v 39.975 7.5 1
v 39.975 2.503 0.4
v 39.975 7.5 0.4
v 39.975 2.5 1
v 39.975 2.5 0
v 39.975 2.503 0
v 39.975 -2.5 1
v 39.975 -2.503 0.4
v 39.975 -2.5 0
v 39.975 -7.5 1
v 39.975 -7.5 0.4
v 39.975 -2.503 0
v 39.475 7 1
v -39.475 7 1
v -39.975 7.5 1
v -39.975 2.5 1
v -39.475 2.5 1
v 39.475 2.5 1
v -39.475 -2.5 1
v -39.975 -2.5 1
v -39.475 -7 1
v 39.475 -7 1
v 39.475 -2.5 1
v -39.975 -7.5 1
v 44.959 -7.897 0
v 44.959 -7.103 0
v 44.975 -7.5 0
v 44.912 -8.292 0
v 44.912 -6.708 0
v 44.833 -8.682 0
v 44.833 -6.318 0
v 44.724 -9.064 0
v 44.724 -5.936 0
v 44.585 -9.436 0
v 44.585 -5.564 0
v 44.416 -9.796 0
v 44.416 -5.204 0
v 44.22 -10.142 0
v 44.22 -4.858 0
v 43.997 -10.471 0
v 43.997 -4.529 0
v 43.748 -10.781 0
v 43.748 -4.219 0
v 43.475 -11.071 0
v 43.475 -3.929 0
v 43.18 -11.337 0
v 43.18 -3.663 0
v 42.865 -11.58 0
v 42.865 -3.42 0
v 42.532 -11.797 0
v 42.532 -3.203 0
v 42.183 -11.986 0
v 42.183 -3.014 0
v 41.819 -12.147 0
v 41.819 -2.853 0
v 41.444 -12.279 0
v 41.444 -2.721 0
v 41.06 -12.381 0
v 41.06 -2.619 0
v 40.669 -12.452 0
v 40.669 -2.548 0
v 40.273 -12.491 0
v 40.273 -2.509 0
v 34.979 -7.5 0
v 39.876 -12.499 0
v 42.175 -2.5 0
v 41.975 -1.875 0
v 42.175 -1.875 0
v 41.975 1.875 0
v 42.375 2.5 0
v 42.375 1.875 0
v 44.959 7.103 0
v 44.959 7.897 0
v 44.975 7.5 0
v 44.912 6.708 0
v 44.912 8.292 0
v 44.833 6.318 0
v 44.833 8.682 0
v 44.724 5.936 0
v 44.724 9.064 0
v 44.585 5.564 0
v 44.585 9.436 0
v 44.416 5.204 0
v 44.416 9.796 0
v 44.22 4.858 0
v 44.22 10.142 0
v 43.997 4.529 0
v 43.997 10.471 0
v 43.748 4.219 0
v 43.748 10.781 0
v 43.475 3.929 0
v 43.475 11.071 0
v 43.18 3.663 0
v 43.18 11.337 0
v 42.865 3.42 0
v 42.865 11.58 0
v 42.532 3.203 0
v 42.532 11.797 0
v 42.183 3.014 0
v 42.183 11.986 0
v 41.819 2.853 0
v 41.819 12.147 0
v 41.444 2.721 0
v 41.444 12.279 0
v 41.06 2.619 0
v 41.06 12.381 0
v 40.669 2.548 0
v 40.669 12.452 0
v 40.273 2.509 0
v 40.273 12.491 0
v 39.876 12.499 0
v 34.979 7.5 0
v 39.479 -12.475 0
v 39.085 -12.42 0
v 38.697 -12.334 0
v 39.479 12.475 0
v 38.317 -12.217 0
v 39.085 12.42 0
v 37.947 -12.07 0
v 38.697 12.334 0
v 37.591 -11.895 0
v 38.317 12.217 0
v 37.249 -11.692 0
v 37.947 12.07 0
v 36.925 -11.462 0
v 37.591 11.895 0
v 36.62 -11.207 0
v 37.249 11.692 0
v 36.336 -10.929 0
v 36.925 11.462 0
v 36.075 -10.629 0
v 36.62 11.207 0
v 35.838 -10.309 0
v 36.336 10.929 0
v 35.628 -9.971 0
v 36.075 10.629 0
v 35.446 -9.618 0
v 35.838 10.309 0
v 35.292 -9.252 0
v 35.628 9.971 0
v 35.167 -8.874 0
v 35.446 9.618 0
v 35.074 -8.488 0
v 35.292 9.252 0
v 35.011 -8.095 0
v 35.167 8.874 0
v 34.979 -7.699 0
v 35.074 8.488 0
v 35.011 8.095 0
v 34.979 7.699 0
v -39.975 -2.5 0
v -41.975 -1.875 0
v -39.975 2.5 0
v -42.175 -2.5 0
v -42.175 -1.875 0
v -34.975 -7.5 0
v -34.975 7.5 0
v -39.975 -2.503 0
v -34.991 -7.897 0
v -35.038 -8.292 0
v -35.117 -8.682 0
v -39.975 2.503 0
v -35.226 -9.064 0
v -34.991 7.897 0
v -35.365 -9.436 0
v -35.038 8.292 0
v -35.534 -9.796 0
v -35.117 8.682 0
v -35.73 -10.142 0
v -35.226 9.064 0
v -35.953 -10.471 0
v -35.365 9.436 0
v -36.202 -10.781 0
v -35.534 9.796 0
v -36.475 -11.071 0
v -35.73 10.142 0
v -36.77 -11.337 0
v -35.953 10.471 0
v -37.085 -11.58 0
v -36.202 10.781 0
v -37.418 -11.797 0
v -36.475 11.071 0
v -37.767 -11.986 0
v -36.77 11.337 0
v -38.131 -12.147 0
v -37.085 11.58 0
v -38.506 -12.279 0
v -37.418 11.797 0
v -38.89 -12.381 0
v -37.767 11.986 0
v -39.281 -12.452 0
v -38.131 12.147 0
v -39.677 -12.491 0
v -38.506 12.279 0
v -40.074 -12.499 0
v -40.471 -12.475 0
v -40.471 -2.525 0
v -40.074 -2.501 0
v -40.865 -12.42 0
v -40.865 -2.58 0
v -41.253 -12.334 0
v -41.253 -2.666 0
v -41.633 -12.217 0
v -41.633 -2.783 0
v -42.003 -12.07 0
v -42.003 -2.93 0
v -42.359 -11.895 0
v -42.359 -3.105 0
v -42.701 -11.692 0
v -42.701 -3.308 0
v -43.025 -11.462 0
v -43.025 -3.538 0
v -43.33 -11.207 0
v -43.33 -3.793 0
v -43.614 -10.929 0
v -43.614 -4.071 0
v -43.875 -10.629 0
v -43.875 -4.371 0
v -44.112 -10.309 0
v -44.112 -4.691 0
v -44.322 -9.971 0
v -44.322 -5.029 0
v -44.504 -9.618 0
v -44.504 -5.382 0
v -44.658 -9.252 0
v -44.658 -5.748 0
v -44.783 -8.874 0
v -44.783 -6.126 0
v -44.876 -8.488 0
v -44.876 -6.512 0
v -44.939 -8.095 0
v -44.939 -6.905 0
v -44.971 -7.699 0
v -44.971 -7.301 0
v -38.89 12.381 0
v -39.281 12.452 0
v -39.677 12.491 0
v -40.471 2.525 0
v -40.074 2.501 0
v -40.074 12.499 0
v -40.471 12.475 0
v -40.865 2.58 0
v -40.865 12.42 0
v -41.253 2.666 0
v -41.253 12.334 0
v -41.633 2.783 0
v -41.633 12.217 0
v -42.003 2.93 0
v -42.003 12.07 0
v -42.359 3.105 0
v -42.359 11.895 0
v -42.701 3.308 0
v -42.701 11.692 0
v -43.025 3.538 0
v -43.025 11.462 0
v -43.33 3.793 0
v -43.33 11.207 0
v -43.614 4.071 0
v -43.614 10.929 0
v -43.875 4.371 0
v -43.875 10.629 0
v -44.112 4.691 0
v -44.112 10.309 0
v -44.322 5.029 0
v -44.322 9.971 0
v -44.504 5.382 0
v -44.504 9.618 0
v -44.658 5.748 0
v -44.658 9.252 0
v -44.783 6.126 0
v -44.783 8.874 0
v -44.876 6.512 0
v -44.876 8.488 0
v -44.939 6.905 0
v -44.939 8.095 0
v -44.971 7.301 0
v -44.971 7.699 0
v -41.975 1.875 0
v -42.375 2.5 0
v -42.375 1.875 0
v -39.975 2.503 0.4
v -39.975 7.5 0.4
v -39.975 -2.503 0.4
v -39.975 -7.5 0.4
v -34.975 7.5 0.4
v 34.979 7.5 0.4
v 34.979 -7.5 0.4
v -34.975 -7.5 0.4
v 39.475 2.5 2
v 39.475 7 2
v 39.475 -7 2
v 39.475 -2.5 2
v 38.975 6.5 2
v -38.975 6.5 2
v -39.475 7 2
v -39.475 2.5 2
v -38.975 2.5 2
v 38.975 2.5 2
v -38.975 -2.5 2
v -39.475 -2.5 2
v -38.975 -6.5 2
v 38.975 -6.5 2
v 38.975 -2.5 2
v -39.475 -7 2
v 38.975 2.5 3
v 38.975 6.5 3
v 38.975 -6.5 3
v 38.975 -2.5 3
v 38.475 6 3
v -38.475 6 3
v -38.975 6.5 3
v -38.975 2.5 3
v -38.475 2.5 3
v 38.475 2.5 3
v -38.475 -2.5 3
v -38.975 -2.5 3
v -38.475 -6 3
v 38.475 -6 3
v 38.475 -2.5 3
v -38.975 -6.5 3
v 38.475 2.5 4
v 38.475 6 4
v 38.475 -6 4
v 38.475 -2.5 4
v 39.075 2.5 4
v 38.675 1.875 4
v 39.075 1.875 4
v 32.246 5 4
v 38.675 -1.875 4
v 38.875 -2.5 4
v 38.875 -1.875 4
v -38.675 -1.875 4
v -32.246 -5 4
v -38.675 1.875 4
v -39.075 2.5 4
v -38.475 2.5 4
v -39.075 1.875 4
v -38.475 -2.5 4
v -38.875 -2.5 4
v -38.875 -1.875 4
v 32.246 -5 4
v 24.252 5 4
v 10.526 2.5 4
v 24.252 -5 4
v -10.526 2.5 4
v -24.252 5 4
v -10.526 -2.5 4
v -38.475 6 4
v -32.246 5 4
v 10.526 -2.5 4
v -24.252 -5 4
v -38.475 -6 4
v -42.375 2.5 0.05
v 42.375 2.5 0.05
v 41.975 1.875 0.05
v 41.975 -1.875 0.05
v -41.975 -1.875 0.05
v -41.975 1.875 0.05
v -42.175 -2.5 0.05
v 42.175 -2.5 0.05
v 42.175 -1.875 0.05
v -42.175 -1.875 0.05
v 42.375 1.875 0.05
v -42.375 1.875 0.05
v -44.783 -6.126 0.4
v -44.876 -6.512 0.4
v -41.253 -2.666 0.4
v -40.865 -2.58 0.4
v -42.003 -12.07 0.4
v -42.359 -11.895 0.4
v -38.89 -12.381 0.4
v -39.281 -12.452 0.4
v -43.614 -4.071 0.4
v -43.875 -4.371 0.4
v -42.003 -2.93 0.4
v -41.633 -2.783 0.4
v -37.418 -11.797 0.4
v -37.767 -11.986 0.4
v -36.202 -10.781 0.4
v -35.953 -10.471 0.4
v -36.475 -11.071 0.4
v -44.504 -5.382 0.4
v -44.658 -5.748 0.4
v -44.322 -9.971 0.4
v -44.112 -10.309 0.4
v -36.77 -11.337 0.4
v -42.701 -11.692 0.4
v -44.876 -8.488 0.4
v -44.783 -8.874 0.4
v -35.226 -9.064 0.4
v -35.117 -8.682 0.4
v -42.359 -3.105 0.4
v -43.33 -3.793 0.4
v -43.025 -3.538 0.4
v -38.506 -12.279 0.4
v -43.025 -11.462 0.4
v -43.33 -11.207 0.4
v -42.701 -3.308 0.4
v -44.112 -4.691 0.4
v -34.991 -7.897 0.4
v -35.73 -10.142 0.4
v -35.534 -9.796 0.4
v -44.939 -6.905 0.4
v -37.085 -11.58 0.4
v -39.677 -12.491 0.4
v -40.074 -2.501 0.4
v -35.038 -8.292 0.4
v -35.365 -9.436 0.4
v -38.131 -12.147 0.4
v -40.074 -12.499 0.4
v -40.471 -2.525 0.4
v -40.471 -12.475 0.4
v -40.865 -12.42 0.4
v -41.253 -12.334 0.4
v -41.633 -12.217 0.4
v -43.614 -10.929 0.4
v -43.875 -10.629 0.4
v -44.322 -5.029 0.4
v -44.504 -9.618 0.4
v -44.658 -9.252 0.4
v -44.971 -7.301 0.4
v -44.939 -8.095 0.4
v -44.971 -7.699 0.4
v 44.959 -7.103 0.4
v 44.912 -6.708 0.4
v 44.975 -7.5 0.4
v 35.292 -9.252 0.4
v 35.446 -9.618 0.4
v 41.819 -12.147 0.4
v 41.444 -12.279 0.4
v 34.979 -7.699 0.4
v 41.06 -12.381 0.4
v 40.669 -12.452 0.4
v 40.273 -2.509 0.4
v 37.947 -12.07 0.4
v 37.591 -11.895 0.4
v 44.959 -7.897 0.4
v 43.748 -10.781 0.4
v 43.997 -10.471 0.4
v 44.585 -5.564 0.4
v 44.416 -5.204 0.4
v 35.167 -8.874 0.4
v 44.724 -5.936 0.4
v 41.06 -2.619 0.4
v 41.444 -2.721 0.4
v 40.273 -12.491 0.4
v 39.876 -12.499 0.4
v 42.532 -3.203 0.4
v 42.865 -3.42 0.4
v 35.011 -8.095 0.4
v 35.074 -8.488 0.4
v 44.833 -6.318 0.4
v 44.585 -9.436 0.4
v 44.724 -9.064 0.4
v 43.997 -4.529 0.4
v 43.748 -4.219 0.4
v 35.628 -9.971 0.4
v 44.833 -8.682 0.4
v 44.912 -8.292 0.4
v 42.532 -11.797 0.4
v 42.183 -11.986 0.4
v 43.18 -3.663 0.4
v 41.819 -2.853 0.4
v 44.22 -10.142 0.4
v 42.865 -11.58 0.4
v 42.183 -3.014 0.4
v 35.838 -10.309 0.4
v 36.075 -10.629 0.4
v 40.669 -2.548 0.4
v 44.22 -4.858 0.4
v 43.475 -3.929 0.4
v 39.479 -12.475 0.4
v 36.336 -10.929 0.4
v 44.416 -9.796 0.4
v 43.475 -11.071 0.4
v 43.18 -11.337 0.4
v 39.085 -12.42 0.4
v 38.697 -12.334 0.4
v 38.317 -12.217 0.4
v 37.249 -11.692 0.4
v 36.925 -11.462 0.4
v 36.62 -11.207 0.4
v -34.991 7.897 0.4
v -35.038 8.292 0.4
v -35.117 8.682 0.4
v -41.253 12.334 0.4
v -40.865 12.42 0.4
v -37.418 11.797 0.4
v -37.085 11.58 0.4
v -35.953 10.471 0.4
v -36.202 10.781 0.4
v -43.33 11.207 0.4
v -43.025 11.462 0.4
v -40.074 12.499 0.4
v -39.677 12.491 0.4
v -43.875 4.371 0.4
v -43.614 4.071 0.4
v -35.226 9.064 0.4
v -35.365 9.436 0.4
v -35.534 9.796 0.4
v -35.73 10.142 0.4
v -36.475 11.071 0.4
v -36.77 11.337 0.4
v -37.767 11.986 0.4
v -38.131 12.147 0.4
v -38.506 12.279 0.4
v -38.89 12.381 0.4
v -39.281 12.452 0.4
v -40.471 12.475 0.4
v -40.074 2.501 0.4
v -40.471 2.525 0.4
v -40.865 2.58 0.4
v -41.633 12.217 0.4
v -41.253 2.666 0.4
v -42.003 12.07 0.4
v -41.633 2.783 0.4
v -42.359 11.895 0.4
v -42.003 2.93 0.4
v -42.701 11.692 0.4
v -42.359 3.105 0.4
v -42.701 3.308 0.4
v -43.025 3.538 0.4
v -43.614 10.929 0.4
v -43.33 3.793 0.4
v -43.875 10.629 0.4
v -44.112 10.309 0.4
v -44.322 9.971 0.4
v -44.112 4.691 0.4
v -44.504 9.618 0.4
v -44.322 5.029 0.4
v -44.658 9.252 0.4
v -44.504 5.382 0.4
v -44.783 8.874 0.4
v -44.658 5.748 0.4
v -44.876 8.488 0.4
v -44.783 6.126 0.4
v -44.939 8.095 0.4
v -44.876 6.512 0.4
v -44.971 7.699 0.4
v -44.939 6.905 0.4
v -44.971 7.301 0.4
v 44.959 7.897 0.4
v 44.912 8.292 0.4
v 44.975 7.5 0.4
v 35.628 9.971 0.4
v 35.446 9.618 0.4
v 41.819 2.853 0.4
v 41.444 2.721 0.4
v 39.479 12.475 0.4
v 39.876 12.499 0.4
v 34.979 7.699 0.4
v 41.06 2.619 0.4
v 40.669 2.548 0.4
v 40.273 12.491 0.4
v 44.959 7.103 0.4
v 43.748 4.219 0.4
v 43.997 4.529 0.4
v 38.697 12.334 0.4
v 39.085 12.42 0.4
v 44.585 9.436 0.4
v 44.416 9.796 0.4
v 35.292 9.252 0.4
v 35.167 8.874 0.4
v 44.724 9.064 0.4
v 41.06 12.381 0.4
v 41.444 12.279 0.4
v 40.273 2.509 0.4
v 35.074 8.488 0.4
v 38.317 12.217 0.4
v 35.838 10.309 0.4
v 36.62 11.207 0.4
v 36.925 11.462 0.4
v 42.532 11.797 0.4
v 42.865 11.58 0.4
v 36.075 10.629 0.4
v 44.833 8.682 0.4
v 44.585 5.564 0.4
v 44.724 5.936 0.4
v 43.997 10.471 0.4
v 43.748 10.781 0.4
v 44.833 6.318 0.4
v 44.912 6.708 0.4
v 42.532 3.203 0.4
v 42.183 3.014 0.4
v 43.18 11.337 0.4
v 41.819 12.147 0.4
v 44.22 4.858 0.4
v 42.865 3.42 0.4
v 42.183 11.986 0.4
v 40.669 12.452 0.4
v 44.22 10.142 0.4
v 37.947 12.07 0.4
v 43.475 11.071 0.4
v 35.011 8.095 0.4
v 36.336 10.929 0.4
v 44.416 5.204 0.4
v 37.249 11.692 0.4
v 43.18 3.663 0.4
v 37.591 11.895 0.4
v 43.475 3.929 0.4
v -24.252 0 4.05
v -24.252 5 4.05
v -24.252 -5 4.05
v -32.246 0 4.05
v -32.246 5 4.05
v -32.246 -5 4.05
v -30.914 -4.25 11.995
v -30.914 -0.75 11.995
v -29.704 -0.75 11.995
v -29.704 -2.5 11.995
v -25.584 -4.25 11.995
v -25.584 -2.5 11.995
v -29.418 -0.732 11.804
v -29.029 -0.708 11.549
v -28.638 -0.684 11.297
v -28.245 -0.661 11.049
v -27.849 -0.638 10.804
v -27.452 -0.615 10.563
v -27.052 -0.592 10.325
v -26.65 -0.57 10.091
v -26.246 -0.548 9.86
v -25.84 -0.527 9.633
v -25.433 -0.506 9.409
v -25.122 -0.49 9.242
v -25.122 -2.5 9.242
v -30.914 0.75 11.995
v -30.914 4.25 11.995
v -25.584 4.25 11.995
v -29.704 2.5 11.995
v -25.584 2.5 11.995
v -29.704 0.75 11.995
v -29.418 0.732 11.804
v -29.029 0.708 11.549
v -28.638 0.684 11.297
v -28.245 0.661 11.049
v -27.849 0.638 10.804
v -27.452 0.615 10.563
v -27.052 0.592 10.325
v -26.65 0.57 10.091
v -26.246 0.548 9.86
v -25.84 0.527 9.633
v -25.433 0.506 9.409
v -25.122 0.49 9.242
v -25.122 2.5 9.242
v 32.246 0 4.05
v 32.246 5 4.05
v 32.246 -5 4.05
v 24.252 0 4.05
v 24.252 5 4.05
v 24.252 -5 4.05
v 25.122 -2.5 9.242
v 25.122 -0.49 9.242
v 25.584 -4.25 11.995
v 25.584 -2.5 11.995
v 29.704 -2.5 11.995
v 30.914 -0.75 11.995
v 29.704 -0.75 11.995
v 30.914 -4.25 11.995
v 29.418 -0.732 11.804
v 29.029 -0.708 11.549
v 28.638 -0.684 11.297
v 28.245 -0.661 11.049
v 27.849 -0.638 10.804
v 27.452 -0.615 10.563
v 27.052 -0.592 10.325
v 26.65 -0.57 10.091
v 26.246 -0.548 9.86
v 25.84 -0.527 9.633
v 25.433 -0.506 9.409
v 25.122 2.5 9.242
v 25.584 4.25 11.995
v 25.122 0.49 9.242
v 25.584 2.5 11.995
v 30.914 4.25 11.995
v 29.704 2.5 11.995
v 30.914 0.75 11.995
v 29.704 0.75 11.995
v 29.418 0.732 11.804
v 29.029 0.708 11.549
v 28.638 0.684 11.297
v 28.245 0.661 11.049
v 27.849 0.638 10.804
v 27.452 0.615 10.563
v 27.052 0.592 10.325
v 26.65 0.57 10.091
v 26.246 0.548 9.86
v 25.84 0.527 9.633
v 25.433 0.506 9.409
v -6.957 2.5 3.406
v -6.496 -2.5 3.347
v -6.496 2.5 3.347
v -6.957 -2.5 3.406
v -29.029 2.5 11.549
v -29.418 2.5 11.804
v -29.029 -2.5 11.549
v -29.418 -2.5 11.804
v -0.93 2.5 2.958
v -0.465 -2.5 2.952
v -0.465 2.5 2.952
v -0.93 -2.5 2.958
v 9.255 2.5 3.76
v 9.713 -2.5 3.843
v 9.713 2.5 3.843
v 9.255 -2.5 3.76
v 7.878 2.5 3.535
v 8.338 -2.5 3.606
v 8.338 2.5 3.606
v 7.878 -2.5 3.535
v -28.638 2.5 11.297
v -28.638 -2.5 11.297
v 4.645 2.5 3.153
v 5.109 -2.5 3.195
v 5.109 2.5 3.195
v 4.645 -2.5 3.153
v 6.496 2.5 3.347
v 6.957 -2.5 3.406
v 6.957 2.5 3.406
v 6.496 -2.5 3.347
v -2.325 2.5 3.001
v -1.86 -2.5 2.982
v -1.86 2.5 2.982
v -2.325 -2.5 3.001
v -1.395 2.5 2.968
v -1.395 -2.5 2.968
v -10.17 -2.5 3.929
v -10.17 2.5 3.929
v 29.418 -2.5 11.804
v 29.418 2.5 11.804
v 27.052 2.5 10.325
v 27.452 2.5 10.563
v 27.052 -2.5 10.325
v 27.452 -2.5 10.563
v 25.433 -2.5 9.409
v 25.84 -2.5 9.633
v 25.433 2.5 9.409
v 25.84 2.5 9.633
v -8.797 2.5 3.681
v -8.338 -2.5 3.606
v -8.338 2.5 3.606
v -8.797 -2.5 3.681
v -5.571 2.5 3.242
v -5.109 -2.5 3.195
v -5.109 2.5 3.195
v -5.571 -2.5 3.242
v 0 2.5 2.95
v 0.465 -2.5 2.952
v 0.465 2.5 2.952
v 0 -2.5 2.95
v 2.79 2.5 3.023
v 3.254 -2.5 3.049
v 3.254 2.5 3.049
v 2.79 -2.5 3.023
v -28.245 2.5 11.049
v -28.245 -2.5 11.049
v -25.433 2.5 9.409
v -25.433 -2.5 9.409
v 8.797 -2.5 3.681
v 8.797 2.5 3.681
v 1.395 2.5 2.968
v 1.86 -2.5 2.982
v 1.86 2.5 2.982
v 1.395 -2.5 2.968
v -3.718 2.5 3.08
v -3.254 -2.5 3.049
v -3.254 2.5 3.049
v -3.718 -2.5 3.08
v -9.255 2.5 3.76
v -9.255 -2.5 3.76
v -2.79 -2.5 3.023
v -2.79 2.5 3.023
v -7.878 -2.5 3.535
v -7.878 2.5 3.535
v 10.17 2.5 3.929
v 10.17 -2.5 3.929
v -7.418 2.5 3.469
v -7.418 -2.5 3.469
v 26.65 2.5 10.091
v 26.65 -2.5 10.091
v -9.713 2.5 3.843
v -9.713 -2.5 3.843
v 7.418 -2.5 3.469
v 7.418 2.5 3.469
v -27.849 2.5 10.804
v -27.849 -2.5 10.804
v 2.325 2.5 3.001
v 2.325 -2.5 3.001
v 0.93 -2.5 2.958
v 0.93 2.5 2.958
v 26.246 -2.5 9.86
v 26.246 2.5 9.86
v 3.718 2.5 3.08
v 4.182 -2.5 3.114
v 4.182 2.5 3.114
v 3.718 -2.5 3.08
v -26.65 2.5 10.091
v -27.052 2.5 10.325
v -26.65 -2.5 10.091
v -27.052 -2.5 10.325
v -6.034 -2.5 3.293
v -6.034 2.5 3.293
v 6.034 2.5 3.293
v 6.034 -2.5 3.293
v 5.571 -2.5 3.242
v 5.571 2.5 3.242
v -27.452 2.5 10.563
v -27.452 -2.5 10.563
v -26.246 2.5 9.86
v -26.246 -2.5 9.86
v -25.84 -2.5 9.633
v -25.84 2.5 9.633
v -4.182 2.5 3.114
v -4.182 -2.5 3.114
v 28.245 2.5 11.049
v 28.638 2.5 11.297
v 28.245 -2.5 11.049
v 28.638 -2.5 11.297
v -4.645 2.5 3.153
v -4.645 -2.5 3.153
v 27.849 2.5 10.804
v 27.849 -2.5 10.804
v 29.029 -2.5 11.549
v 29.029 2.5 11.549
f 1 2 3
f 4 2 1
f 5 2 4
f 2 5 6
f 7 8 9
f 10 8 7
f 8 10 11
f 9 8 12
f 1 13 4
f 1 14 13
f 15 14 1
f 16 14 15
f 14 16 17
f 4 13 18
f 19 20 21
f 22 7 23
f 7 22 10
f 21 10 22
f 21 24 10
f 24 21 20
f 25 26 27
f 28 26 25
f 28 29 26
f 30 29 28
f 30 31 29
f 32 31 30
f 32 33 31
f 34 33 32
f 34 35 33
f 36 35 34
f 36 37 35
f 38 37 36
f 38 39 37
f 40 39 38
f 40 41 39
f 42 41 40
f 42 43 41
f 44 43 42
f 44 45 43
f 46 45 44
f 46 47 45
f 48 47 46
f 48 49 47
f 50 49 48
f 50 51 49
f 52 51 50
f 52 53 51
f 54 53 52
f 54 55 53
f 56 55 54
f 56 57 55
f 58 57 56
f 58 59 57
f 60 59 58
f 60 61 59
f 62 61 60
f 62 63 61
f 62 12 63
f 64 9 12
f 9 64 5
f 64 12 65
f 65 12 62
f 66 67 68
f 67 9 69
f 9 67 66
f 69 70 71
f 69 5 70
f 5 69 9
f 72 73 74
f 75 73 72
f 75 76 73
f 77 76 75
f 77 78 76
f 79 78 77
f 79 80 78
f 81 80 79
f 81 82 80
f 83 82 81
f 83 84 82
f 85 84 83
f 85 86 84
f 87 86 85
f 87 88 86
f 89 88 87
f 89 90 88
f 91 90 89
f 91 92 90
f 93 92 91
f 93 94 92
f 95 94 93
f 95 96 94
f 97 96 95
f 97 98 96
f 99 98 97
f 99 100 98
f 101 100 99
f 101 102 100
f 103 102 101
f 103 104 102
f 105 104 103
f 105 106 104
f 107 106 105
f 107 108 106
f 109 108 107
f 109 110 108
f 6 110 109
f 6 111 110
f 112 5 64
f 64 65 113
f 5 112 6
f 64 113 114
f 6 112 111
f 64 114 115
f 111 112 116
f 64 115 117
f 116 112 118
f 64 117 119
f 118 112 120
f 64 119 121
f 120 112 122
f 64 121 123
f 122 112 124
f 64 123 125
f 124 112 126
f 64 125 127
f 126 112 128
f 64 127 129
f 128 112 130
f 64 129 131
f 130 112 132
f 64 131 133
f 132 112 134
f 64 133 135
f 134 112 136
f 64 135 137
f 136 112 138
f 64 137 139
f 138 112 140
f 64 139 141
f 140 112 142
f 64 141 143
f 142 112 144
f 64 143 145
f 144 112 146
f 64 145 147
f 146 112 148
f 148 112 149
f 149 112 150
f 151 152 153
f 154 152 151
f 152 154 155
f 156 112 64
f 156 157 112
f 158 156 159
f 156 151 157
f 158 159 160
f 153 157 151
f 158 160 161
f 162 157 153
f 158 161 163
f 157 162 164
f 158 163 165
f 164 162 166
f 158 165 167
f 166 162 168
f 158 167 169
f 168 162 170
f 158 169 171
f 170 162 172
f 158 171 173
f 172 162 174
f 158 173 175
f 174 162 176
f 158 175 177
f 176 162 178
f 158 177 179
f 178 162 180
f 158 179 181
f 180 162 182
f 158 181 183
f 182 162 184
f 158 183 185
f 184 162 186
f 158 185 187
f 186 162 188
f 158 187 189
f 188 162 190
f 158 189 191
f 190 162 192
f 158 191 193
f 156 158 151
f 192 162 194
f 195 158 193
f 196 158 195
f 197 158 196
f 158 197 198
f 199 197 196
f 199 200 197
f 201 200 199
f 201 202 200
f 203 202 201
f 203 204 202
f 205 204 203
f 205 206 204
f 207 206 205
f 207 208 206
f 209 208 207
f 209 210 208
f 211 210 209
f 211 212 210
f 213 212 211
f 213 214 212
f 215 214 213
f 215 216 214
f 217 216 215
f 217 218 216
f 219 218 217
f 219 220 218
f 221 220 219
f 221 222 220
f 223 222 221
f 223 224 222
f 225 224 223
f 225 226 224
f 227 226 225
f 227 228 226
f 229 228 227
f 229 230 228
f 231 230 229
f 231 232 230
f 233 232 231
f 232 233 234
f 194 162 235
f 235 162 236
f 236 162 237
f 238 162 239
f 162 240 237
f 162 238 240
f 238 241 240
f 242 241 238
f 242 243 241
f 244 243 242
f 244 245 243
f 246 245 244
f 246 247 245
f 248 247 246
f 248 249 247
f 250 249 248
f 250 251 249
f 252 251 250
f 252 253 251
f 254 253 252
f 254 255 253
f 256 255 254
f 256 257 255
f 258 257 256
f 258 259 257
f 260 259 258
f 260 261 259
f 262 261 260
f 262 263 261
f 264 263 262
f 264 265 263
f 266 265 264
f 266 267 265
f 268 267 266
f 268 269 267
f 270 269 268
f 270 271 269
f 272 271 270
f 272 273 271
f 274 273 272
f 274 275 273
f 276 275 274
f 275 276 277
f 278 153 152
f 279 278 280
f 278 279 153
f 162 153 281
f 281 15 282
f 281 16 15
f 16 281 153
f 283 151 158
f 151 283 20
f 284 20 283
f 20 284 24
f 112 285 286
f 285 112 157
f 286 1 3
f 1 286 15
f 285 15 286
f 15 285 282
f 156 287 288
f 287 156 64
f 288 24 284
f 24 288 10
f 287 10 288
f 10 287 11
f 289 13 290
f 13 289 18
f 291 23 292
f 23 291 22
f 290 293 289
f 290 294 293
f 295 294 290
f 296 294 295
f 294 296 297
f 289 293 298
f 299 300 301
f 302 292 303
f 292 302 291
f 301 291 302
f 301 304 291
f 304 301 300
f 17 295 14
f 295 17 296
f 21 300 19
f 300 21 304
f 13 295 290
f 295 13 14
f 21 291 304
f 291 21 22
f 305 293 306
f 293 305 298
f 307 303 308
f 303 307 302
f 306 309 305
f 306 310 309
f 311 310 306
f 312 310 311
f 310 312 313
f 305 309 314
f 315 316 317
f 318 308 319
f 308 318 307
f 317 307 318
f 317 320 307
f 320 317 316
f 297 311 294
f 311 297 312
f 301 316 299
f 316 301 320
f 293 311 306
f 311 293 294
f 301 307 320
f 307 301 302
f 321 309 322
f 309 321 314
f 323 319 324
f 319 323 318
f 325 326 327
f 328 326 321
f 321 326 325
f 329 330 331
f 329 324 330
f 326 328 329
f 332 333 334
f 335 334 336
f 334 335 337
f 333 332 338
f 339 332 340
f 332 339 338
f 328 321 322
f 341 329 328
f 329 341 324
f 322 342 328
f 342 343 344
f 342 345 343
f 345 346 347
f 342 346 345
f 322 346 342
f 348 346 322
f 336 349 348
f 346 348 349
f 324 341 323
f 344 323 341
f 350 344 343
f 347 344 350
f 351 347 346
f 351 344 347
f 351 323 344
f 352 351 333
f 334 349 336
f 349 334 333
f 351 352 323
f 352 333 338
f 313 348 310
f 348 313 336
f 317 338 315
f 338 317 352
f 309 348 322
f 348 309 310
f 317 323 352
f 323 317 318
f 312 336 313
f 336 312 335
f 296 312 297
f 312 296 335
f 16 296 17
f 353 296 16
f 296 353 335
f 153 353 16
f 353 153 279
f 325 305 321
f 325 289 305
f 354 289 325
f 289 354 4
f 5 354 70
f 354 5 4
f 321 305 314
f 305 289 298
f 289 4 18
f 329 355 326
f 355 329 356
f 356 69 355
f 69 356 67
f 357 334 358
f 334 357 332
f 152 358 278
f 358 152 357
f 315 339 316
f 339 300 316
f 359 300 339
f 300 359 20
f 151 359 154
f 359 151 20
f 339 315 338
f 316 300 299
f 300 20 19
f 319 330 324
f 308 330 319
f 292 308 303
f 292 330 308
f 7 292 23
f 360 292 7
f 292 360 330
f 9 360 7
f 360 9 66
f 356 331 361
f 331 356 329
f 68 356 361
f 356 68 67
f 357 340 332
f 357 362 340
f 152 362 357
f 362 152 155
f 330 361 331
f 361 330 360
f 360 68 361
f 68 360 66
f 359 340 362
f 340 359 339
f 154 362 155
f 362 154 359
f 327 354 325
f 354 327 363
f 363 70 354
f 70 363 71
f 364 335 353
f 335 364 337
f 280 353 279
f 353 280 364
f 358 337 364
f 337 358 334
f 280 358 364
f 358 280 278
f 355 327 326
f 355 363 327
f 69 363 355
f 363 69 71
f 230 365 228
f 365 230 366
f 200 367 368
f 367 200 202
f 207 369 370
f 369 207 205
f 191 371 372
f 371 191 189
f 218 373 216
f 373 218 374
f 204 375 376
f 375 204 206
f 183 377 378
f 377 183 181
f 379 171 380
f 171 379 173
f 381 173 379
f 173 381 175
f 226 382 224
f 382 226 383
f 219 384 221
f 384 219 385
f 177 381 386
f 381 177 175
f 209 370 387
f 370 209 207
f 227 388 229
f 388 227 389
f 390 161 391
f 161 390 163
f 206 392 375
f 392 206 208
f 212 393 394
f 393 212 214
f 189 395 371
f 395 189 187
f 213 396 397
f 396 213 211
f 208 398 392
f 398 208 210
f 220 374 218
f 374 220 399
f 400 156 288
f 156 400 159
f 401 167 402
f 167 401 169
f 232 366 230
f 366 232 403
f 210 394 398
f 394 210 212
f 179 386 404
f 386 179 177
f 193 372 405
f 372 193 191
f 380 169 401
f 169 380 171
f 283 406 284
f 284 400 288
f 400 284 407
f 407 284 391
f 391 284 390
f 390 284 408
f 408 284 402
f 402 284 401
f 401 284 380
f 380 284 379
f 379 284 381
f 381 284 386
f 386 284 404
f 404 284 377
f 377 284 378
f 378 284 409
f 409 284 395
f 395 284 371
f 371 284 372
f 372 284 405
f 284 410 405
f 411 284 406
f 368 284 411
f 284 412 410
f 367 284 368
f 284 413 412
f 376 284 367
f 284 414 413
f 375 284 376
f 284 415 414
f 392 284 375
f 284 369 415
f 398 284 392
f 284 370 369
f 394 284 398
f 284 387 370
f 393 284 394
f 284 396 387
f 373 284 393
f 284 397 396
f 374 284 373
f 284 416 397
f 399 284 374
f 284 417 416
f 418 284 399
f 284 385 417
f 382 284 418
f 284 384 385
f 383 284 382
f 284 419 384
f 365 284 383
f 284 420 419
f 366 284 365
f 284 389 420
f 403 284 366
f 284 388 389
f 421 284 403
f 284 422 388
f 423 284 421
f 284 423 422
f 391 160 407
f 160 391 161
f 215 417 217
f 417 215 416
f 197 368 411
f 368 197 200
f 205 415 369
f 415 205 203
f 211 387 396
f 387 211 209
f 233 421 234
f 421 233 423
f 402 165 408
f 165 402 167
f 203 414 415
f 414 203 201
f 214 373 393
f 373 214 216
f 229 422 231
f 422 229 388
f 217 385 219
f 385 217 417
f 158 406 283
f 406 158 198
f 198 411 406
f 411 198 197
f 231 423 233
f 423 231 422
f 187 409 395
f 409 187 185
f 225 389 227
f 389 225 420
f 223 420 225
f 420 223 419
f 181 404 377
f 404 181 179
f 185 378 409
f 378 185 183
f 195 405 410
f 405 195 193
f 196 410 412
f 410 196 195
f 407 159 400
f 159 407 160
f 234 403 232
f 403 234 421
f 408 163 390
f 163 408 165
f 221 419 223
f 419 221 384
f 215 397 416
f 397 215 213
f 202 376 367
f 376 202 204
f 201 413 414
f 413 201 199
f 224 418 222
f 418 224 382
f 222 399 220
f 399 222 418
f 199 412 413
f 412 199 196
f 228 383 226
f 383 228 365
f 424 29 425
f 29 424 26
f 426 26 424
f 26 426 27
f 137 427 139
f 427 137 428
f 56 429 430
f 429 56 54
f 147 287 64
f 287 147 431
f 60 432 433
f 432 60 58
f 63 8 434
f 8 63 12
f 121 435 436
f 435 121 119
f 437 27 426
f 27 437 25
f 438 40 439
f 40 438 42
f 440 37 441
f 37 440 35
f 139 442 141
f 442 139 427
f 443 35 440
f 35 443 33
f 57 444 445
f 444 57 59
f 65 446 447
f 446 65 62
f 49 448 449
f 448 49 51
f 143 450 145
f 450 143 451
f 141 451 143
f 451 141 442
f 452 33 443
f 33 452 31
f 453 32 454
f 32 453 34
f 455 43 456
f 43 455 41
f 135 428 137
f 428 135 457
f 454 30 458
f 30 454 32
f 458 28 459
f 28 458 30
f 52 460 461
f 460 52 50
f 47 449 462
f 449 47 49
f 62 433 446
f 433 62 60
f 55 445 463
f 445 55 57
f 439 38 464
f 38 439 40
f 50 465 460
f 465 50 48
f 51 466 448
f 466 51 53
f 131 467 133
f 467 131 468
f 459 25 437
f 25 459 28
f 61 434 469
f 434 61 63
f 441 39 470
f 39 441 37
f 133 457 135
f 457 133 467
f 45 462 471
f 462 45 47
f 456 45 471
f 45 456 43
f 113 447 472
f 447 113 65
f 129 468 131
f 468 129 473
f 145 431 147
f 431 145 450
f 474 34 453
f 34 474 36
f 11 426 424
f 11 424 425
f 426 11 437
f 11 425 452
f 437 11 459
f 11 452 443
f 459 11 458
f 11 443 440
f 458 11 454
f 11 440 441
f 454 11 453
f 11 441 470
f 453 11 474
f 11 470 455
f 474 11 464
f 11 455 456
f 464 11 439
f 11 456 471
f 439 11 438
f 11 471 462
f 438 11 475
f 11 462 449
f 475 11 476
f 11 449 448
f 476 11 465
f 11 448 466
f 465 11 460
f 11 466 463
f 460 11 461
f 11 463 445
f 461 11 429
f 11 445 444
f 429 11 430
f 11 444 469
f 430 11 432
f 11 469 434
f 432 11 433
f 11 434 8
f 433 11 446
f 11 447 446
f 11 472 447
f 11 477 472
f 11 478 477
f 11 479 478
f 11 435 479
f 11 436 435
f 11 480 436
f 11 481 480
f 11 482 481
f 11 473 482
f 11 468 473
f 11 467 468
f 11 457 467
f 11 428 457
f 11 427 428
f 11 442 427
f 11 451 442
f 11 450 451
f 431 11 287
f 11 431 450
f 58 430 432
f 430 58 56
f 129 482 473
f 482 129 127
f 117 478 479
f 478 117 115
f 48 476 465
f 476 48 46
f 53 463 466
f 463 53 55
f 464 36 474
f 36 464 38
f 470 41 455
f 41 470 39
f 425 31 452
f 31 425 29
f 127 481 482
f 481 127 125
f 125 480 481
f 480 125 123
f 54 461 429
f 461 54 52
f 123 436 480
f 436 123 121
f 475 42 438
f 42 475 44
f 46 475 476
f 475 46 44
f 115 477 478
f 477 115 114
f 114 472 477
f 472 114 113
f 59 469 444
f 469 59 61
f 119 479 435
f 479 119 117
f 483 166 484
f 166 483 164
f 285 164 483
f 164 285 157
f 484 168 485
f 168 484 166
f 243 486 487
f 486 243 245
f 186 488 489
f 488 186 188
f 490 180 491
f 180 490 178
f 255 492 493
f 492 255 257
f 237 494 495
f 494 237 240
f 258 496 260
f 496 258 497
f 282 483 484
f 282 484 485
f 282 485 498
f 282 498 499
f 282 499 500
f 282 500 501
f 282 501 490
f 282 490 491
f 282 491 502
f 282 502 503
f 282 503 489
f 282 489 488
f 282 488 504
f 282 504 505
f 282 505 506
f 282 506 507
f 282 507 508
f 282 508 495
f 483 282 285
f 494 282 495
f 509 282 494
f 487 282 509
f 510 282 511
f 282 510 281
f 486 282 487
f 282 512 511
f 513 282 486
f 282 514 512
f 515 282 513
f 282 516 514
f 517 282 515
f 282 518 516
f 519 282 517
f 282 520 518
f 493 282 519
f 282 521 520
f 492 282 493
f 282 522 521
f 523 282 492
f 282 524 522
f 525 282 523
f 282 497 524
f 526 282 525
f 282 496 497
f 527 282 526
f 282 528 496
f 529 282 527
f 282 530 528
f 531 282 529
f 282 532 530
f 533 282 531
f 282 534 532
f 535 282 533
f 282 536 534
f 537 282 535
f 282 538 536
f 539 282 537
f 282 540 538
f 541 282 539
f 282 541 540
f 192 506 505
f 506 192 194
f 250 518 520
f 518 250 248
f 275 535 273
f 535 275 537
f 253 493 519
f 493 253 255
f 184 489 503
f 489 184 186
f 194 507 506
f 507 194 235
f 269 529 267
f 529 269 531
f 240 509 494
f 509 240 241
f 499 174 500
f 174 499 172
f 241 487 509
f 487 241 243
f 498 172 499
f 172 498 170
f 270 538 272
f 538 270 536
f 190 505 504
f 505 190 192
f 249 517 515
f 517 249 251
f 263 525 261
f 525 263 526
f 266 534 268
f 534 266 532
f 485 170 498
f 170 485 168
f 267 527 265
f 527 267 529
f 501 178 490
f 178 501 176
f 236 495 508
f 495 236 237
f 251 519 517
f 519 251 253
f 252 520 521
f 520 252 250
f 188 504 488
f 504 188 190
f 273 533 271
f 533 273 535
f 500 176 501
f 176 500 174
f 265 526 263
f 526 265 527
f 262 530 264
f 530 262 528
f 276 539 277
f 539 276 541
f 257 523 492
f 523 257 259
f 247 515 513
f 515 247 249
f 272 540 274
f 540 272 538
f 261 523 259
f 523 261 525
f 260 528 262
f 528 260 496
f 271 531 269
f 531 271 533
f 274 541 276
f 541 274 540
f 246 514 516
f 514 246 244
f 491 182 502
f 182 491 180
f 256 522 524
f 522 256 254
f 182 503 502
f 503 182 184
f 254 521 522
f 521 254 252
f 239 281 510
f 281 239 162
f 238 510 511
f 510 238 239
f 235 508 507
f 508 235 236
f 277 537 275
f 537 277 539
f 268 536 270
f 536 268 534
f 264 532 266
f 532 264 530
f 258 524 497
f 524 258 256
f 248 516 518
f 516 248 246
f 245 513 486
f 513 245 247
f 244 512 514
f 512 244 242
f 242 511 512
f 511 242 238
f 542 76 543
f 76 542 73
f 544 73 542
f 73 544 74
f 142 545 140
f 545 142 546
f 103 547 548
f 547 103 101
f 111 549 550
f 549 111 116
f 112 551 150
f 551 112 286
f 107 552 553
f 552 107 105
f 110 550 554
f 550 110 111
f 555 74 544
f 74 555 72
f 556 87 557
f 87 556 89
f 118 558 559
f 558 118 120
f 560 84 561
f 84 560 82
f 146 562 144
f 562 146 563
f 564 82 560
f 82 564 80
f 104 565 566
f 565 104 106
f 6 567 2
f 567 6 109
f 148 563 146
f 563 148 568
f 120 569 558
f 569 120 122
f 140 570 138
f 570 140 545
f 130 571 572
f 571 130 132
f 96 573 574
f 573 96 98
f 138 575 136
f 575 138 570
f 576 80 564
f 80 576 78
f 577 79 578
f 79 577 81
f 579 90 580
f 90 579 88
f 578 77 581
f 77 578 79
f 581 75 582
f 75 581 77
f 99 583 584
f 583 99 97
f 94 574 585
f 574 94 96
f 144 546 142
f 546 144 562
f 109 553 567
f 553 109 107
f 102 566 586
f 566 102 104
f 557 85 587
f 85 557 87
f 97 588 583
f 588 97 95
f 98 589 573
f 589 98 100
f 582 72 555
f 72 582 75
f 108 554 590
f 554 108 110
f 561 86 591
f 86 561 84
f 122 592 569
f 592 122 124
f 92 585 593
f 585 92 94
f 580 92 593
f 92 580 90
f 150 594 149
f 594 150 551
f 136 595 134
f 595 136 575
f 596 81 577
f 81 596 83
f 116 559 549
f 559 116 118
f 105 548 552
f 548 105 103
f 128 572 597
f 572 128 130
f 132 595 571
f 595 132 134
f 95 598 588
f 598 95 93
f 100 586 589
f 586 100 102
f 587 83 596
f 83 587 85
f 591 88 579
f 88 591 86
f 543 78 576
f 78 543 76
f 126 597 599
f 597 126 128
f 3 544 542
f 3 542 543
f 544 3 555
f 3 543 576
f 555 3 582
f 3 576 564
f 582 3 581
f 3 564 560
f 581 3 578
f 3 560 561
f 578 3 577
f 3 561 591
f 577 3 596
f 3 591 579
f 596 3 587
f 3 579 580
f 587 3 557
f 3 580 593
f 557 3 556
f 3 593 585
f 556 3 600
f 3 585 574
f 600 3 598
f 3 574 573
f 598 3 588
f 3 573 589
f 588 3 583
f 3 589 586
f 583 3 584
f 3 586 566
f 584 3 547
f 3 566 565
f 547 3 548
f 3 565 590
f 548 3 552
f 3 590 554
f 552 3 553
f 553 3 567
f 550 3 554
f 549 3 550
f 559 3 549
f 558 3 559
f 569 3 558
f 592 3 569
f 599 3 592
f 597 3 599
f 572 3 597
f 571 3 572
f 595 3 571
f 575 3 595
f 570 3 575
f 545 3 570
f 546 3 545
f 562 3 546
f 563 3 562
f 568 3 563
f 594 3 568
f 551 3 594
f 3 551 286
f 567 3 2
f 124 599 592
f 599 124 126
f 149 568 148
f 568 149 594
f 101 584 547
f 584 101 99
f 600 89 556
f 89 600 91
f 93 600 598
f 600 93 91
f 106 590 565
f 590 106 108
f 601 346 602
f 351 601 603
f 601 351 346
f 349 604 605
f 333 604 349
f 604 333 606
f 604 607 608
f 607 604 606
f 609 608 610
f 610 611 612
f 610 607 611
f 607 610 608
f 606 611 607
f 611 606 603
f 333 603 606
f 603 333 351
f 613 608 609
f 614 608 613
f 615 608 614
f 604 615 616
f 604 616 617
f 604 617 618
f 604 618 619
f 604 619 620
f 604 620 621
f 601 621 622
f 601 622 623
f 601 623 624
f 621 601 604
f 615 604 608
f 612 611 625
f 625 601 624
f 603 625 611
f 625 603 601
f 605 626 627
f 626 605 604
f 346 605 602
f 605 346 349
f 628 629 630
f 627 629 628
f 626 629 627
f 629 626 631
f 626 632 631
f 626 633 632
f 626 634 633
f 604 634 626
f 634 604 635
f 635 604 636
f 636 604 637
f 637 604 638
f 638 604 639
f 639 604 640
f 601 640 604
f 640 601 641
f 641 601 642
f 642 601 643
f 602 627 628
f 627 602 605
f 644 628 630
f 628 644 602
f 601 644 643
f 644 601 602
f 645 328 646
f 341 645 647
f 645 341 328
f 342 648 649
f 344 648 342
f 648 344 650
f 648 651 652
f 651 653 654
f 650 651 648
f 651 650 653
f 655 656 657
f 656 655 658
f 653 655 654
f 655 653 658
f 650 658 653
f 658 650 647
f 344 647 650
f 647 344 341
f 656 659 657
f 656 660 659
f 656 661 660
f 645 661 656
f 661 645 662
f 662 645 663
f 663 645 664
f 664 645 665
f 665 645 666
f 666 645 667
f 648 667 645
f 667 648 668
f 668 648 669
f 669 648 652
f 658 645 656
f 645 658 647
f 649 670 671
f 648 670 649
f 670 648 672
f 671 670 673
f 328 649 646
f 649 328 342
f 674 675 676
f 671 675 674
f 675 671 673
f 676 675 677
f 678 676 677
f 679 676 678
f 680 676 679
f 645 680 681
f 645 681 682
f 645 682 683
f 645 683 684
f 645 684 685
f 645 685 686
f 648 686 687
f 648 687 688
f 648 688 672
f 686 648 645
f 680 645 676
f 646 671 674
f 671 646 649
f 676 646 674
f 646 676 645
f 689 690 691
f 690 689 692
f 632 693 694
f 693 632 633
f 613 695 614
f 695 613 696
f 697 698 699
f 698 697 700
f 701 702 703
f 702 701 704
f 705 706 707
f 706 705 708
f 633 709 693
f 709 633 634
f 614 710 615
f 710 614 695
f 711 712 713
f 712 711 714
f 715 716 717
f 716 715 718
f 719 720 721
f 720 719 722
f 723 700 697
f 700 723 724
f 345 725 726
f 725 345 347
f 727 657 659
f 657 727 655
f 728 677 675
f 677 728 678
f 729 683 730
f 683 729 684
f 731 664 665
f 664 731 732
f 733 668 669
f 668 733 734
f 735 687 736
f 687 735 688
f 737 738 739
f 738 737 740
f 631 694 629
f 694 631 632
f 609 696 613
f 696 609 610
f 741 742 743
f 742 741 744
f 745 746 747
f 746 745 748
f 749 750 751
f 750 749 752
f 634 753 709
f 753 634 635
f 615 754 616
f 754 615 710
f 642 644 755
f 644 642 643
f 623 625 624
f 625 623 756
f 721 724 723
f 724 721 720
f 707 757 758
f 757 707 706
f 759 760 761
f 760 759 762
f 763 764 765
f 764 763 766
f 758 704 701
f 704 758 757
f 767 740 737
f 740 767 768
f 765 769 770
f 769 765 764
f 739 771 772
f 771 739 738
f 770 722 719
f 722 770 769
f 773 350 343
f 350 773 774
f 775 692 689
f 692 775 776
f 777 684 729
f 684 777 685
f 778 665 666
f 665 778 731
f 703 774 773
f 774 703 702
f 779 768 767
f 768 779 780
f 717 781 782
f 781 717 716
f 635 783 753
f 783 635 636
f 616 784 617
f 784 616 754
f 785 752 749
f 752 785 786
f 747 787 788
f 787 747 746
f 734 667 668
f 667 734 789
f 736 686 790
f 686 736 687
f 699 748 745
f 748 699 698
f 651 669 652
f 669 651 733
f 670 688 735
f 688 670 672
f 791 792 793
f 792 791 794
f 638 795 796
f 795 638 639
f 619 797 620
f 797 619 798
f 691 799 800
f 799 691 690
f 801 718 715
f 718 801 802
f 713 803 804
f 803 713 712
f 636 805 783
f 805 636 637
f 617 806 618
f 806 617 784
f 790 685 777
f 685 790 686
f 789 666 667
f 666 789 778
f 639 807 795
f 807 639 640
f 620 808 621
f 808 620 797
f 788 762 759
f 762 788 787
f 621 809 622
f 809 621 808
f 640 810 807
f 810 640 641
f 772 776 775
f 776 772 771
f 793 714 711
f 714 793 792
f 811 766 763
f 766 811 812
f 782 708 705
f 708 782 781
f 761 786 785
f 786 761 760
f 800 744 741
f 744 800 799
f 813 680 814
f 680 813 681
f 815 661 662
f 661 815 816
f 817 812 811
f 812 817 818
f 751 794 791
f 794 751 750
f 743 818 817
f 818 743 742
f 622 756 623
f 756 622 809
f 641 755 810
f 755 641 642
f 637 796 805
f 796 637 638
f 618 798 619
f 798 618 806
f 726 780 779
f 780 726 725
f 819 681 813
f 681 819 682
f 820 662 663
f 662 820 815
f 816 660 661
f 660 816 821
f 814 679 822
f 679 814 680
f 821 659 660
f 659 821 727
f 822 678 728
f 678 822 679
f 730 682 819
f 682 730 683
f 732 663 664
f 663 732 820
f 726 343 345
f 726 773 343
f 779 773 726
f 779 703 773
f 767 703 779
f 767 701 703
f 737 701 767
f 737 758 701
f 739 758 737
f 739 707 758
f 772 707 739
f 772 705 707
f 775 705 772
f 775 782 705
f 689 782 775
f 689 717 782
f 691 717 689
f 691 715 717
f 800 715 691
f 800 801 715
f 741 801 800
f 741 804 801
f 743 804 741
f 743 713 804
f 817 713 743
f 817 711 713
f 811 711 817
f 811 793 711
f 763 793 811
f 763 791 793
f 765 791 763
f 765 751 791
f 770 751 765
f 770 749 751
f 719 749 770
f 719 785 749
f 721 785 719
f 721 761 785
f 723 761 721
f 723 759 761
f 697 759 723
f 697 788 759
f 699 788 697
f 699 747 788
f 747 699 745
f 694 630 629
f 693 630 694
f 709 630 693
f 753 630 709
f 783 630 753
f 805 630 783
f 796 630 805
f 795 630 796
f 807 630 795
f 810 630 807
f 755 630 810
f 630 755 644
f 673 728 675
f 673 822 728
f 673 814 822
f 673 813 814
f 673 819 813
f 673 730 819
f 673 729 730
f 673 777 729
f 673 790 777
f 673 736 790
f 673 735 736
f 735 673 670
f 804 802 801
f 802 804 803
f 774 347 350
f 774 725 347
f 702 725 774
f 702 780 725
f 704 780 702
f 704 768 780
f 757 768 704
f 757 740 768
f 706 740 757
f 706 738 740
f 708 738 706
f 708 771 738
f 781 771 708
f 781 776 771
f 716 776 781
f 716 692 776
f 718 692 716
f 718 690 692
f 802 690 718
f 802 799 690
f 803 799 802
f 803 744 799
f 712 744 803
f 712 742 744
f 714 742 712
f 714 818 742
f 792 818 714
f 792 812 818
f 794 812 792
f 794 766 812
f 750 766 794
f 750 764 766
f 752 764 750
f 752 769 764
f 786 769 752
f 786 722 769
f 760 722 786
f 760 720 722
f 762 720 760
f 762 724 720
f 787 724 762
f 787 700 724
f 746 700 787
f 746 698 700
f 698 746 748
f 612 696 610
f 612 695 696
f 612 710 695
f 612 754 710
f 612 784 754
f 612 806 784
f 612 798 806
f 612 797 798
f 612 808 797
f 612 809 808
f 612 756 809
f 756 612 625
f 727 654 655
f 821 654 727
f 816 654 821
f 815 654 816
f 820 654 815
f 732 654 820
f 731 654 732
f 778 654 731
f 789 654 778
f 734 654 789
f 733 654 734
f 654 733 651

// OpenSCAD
$fa=0.5;
$fs=0.4;

/* [Global] */

// Medal diameter (mm) as slicer shows (printed diameter may be slightly different than model diameter)
medal_diameter=106.6;
// Medal edge thickness (mm)
medal_edge=5;
// Support base height (mm)
suport_base=4;
//Support base edge incline (mm)
suport_wall=2;

/* [Hidden] */
medal_radius=medal_diameter*0.5;

module model_medal(medal_r,medal_e)
{
	cylinder(r=medal_r,h=medal_e);
}

module support_figure(medal_r,medal_e)
{
	translate([0,-medal_e*0.5,0]) hull()
	{
		translate([-medal_r*0.15*0.5,-medal_e*0.5,0]) cube([medal_r*0.15,medal_e,0.05]);
		translate([-medal_r*0.1*0.5,-medal_e*0.7*0.5,medal_r*0.15-0.05]) cube([medal_r*0.1,medal_e*0.7,0.05]);
	}
	translate([0,medal_e*0.5,0]) hull()
	{
		translate([-medal_r*0.15*0.5,-medal_e*0.5,0]) cube([medal_r*0.15,medal_e,0.05]);
		translate([-medal_r*0.1*0.5,-medal_e*0.7*0.5,medal_r*0.15-0.05]) cube([medal_r*0.1,medal_e*0.7,0.05]);
	}
}

module medal_support_base(medal_r,medal_e,base,wall)
{
	adh_r=min(5,medal_e);
	translate([-medal_r*0.75,-medal_e*1.5,0]) cube([medal_r*1.5,medal_e*3,base*0.25]);
	translate([-medal_r*0.75+wall*0.25,-medal_e*1.5+wall*0.25,base*0.25]) cube([medal_r*1.5-wall*0.5,medal_e*3-wall*0.5,base*0.25]);
	translate([-medal_r*0.75+wall*0.5,-medal_e*1.5+wall*0.5,base*0.5]) cube([medal_r*1.5-wall,medal_e*3-wall,base*0.25]);
	translate([-medal_r*0.75+wall*0.75,-medal_e*1.5+wall*0.75,base*0.75]) cube([medal_r*1.5-wall*1.5,medal_e*3-wall*1.5,base*0.25]);
	// ladders
	hull()
	{
		translate([-medal_r*0.75-wall,-medal_e*0.5,0]) cube([medal_r*1.5+wall*2,medal_e,0.05]);
		translate([-medal_r*0.75+wall*0.65,-medal_e*0.5,base-0.05]) cube([medal_r*1.5-wall*1.3,medal_e,0.05]);
	}
	translate([0,-medal_e*0.5,0]) hull()
	{
		translate([-medal_r*0.75-wall-0.2,0,0]) cube([medal_r*1.5+wall*2+0.4,medal_e*0.125,0.05]);
		translate([-medal_r*0.75+wall*0.65-0.2,0,base-0.05]) cube([medal_r*1.5-wall*1.3+0.4,medal_e*0.125,0.05]);
	}
	translate([0,medal_e*(0.50-0.125)]) hull()
	{
		translate([-medal_r*0.75-wall-0.4,0,0]) cube([medal_r*1.5+wall*2+0.8,medal_e*0.125,0.05]);
		translate([-medal_r*0.75+wall*0.65-0.4,0,base-0.05]) cube([medal_r*1.5-wall*1.3+0.8,medal_e*0.125,0.05]);
	}
	// improve corners adhesion against bending
	translate([-medal_r*0.75,-medal_e*1.5,0]) cylinder(r=adh_r,h=0.4);
	translate([medal_r*0.75,-medal_e*1.5,0]) cylinder(r=adh_r,h=0.4);
	translate([-medal_r*0.75,medal_e*1.5,0]) cylinder(r=adh_r,h=0.4);
	translate([medal_r*0.75,medal_e*1.5,0]) cylinder(r=adh_r,h=0.4);
}

module medal_support()
{
	medal_support_base(medal_radius,medal_edge,suport_base,suport_wall);
	translate([-medal_radius*0.53,0,suport_base]) support_figure(medal_radius,medal_edge);
	translate([medal_radius*0.53,0,suport_base]) support_figure(medal_radius,medal_edge);
}

color([0.7,0,0]) difference()
{
	medal_support();
	translate([0,-medal_edge*0.5,medal_radius+suport_base-1.05]) rotate([-90,0,0]) model_medal(medal_radius,medal_edge);
}

//translate([0,-medal_edge*0.5,medal_radius+suport_base-1]) rotate([-90,0,0]) color([1,1,0]) model_medal(medal_radius,medal_edge);
